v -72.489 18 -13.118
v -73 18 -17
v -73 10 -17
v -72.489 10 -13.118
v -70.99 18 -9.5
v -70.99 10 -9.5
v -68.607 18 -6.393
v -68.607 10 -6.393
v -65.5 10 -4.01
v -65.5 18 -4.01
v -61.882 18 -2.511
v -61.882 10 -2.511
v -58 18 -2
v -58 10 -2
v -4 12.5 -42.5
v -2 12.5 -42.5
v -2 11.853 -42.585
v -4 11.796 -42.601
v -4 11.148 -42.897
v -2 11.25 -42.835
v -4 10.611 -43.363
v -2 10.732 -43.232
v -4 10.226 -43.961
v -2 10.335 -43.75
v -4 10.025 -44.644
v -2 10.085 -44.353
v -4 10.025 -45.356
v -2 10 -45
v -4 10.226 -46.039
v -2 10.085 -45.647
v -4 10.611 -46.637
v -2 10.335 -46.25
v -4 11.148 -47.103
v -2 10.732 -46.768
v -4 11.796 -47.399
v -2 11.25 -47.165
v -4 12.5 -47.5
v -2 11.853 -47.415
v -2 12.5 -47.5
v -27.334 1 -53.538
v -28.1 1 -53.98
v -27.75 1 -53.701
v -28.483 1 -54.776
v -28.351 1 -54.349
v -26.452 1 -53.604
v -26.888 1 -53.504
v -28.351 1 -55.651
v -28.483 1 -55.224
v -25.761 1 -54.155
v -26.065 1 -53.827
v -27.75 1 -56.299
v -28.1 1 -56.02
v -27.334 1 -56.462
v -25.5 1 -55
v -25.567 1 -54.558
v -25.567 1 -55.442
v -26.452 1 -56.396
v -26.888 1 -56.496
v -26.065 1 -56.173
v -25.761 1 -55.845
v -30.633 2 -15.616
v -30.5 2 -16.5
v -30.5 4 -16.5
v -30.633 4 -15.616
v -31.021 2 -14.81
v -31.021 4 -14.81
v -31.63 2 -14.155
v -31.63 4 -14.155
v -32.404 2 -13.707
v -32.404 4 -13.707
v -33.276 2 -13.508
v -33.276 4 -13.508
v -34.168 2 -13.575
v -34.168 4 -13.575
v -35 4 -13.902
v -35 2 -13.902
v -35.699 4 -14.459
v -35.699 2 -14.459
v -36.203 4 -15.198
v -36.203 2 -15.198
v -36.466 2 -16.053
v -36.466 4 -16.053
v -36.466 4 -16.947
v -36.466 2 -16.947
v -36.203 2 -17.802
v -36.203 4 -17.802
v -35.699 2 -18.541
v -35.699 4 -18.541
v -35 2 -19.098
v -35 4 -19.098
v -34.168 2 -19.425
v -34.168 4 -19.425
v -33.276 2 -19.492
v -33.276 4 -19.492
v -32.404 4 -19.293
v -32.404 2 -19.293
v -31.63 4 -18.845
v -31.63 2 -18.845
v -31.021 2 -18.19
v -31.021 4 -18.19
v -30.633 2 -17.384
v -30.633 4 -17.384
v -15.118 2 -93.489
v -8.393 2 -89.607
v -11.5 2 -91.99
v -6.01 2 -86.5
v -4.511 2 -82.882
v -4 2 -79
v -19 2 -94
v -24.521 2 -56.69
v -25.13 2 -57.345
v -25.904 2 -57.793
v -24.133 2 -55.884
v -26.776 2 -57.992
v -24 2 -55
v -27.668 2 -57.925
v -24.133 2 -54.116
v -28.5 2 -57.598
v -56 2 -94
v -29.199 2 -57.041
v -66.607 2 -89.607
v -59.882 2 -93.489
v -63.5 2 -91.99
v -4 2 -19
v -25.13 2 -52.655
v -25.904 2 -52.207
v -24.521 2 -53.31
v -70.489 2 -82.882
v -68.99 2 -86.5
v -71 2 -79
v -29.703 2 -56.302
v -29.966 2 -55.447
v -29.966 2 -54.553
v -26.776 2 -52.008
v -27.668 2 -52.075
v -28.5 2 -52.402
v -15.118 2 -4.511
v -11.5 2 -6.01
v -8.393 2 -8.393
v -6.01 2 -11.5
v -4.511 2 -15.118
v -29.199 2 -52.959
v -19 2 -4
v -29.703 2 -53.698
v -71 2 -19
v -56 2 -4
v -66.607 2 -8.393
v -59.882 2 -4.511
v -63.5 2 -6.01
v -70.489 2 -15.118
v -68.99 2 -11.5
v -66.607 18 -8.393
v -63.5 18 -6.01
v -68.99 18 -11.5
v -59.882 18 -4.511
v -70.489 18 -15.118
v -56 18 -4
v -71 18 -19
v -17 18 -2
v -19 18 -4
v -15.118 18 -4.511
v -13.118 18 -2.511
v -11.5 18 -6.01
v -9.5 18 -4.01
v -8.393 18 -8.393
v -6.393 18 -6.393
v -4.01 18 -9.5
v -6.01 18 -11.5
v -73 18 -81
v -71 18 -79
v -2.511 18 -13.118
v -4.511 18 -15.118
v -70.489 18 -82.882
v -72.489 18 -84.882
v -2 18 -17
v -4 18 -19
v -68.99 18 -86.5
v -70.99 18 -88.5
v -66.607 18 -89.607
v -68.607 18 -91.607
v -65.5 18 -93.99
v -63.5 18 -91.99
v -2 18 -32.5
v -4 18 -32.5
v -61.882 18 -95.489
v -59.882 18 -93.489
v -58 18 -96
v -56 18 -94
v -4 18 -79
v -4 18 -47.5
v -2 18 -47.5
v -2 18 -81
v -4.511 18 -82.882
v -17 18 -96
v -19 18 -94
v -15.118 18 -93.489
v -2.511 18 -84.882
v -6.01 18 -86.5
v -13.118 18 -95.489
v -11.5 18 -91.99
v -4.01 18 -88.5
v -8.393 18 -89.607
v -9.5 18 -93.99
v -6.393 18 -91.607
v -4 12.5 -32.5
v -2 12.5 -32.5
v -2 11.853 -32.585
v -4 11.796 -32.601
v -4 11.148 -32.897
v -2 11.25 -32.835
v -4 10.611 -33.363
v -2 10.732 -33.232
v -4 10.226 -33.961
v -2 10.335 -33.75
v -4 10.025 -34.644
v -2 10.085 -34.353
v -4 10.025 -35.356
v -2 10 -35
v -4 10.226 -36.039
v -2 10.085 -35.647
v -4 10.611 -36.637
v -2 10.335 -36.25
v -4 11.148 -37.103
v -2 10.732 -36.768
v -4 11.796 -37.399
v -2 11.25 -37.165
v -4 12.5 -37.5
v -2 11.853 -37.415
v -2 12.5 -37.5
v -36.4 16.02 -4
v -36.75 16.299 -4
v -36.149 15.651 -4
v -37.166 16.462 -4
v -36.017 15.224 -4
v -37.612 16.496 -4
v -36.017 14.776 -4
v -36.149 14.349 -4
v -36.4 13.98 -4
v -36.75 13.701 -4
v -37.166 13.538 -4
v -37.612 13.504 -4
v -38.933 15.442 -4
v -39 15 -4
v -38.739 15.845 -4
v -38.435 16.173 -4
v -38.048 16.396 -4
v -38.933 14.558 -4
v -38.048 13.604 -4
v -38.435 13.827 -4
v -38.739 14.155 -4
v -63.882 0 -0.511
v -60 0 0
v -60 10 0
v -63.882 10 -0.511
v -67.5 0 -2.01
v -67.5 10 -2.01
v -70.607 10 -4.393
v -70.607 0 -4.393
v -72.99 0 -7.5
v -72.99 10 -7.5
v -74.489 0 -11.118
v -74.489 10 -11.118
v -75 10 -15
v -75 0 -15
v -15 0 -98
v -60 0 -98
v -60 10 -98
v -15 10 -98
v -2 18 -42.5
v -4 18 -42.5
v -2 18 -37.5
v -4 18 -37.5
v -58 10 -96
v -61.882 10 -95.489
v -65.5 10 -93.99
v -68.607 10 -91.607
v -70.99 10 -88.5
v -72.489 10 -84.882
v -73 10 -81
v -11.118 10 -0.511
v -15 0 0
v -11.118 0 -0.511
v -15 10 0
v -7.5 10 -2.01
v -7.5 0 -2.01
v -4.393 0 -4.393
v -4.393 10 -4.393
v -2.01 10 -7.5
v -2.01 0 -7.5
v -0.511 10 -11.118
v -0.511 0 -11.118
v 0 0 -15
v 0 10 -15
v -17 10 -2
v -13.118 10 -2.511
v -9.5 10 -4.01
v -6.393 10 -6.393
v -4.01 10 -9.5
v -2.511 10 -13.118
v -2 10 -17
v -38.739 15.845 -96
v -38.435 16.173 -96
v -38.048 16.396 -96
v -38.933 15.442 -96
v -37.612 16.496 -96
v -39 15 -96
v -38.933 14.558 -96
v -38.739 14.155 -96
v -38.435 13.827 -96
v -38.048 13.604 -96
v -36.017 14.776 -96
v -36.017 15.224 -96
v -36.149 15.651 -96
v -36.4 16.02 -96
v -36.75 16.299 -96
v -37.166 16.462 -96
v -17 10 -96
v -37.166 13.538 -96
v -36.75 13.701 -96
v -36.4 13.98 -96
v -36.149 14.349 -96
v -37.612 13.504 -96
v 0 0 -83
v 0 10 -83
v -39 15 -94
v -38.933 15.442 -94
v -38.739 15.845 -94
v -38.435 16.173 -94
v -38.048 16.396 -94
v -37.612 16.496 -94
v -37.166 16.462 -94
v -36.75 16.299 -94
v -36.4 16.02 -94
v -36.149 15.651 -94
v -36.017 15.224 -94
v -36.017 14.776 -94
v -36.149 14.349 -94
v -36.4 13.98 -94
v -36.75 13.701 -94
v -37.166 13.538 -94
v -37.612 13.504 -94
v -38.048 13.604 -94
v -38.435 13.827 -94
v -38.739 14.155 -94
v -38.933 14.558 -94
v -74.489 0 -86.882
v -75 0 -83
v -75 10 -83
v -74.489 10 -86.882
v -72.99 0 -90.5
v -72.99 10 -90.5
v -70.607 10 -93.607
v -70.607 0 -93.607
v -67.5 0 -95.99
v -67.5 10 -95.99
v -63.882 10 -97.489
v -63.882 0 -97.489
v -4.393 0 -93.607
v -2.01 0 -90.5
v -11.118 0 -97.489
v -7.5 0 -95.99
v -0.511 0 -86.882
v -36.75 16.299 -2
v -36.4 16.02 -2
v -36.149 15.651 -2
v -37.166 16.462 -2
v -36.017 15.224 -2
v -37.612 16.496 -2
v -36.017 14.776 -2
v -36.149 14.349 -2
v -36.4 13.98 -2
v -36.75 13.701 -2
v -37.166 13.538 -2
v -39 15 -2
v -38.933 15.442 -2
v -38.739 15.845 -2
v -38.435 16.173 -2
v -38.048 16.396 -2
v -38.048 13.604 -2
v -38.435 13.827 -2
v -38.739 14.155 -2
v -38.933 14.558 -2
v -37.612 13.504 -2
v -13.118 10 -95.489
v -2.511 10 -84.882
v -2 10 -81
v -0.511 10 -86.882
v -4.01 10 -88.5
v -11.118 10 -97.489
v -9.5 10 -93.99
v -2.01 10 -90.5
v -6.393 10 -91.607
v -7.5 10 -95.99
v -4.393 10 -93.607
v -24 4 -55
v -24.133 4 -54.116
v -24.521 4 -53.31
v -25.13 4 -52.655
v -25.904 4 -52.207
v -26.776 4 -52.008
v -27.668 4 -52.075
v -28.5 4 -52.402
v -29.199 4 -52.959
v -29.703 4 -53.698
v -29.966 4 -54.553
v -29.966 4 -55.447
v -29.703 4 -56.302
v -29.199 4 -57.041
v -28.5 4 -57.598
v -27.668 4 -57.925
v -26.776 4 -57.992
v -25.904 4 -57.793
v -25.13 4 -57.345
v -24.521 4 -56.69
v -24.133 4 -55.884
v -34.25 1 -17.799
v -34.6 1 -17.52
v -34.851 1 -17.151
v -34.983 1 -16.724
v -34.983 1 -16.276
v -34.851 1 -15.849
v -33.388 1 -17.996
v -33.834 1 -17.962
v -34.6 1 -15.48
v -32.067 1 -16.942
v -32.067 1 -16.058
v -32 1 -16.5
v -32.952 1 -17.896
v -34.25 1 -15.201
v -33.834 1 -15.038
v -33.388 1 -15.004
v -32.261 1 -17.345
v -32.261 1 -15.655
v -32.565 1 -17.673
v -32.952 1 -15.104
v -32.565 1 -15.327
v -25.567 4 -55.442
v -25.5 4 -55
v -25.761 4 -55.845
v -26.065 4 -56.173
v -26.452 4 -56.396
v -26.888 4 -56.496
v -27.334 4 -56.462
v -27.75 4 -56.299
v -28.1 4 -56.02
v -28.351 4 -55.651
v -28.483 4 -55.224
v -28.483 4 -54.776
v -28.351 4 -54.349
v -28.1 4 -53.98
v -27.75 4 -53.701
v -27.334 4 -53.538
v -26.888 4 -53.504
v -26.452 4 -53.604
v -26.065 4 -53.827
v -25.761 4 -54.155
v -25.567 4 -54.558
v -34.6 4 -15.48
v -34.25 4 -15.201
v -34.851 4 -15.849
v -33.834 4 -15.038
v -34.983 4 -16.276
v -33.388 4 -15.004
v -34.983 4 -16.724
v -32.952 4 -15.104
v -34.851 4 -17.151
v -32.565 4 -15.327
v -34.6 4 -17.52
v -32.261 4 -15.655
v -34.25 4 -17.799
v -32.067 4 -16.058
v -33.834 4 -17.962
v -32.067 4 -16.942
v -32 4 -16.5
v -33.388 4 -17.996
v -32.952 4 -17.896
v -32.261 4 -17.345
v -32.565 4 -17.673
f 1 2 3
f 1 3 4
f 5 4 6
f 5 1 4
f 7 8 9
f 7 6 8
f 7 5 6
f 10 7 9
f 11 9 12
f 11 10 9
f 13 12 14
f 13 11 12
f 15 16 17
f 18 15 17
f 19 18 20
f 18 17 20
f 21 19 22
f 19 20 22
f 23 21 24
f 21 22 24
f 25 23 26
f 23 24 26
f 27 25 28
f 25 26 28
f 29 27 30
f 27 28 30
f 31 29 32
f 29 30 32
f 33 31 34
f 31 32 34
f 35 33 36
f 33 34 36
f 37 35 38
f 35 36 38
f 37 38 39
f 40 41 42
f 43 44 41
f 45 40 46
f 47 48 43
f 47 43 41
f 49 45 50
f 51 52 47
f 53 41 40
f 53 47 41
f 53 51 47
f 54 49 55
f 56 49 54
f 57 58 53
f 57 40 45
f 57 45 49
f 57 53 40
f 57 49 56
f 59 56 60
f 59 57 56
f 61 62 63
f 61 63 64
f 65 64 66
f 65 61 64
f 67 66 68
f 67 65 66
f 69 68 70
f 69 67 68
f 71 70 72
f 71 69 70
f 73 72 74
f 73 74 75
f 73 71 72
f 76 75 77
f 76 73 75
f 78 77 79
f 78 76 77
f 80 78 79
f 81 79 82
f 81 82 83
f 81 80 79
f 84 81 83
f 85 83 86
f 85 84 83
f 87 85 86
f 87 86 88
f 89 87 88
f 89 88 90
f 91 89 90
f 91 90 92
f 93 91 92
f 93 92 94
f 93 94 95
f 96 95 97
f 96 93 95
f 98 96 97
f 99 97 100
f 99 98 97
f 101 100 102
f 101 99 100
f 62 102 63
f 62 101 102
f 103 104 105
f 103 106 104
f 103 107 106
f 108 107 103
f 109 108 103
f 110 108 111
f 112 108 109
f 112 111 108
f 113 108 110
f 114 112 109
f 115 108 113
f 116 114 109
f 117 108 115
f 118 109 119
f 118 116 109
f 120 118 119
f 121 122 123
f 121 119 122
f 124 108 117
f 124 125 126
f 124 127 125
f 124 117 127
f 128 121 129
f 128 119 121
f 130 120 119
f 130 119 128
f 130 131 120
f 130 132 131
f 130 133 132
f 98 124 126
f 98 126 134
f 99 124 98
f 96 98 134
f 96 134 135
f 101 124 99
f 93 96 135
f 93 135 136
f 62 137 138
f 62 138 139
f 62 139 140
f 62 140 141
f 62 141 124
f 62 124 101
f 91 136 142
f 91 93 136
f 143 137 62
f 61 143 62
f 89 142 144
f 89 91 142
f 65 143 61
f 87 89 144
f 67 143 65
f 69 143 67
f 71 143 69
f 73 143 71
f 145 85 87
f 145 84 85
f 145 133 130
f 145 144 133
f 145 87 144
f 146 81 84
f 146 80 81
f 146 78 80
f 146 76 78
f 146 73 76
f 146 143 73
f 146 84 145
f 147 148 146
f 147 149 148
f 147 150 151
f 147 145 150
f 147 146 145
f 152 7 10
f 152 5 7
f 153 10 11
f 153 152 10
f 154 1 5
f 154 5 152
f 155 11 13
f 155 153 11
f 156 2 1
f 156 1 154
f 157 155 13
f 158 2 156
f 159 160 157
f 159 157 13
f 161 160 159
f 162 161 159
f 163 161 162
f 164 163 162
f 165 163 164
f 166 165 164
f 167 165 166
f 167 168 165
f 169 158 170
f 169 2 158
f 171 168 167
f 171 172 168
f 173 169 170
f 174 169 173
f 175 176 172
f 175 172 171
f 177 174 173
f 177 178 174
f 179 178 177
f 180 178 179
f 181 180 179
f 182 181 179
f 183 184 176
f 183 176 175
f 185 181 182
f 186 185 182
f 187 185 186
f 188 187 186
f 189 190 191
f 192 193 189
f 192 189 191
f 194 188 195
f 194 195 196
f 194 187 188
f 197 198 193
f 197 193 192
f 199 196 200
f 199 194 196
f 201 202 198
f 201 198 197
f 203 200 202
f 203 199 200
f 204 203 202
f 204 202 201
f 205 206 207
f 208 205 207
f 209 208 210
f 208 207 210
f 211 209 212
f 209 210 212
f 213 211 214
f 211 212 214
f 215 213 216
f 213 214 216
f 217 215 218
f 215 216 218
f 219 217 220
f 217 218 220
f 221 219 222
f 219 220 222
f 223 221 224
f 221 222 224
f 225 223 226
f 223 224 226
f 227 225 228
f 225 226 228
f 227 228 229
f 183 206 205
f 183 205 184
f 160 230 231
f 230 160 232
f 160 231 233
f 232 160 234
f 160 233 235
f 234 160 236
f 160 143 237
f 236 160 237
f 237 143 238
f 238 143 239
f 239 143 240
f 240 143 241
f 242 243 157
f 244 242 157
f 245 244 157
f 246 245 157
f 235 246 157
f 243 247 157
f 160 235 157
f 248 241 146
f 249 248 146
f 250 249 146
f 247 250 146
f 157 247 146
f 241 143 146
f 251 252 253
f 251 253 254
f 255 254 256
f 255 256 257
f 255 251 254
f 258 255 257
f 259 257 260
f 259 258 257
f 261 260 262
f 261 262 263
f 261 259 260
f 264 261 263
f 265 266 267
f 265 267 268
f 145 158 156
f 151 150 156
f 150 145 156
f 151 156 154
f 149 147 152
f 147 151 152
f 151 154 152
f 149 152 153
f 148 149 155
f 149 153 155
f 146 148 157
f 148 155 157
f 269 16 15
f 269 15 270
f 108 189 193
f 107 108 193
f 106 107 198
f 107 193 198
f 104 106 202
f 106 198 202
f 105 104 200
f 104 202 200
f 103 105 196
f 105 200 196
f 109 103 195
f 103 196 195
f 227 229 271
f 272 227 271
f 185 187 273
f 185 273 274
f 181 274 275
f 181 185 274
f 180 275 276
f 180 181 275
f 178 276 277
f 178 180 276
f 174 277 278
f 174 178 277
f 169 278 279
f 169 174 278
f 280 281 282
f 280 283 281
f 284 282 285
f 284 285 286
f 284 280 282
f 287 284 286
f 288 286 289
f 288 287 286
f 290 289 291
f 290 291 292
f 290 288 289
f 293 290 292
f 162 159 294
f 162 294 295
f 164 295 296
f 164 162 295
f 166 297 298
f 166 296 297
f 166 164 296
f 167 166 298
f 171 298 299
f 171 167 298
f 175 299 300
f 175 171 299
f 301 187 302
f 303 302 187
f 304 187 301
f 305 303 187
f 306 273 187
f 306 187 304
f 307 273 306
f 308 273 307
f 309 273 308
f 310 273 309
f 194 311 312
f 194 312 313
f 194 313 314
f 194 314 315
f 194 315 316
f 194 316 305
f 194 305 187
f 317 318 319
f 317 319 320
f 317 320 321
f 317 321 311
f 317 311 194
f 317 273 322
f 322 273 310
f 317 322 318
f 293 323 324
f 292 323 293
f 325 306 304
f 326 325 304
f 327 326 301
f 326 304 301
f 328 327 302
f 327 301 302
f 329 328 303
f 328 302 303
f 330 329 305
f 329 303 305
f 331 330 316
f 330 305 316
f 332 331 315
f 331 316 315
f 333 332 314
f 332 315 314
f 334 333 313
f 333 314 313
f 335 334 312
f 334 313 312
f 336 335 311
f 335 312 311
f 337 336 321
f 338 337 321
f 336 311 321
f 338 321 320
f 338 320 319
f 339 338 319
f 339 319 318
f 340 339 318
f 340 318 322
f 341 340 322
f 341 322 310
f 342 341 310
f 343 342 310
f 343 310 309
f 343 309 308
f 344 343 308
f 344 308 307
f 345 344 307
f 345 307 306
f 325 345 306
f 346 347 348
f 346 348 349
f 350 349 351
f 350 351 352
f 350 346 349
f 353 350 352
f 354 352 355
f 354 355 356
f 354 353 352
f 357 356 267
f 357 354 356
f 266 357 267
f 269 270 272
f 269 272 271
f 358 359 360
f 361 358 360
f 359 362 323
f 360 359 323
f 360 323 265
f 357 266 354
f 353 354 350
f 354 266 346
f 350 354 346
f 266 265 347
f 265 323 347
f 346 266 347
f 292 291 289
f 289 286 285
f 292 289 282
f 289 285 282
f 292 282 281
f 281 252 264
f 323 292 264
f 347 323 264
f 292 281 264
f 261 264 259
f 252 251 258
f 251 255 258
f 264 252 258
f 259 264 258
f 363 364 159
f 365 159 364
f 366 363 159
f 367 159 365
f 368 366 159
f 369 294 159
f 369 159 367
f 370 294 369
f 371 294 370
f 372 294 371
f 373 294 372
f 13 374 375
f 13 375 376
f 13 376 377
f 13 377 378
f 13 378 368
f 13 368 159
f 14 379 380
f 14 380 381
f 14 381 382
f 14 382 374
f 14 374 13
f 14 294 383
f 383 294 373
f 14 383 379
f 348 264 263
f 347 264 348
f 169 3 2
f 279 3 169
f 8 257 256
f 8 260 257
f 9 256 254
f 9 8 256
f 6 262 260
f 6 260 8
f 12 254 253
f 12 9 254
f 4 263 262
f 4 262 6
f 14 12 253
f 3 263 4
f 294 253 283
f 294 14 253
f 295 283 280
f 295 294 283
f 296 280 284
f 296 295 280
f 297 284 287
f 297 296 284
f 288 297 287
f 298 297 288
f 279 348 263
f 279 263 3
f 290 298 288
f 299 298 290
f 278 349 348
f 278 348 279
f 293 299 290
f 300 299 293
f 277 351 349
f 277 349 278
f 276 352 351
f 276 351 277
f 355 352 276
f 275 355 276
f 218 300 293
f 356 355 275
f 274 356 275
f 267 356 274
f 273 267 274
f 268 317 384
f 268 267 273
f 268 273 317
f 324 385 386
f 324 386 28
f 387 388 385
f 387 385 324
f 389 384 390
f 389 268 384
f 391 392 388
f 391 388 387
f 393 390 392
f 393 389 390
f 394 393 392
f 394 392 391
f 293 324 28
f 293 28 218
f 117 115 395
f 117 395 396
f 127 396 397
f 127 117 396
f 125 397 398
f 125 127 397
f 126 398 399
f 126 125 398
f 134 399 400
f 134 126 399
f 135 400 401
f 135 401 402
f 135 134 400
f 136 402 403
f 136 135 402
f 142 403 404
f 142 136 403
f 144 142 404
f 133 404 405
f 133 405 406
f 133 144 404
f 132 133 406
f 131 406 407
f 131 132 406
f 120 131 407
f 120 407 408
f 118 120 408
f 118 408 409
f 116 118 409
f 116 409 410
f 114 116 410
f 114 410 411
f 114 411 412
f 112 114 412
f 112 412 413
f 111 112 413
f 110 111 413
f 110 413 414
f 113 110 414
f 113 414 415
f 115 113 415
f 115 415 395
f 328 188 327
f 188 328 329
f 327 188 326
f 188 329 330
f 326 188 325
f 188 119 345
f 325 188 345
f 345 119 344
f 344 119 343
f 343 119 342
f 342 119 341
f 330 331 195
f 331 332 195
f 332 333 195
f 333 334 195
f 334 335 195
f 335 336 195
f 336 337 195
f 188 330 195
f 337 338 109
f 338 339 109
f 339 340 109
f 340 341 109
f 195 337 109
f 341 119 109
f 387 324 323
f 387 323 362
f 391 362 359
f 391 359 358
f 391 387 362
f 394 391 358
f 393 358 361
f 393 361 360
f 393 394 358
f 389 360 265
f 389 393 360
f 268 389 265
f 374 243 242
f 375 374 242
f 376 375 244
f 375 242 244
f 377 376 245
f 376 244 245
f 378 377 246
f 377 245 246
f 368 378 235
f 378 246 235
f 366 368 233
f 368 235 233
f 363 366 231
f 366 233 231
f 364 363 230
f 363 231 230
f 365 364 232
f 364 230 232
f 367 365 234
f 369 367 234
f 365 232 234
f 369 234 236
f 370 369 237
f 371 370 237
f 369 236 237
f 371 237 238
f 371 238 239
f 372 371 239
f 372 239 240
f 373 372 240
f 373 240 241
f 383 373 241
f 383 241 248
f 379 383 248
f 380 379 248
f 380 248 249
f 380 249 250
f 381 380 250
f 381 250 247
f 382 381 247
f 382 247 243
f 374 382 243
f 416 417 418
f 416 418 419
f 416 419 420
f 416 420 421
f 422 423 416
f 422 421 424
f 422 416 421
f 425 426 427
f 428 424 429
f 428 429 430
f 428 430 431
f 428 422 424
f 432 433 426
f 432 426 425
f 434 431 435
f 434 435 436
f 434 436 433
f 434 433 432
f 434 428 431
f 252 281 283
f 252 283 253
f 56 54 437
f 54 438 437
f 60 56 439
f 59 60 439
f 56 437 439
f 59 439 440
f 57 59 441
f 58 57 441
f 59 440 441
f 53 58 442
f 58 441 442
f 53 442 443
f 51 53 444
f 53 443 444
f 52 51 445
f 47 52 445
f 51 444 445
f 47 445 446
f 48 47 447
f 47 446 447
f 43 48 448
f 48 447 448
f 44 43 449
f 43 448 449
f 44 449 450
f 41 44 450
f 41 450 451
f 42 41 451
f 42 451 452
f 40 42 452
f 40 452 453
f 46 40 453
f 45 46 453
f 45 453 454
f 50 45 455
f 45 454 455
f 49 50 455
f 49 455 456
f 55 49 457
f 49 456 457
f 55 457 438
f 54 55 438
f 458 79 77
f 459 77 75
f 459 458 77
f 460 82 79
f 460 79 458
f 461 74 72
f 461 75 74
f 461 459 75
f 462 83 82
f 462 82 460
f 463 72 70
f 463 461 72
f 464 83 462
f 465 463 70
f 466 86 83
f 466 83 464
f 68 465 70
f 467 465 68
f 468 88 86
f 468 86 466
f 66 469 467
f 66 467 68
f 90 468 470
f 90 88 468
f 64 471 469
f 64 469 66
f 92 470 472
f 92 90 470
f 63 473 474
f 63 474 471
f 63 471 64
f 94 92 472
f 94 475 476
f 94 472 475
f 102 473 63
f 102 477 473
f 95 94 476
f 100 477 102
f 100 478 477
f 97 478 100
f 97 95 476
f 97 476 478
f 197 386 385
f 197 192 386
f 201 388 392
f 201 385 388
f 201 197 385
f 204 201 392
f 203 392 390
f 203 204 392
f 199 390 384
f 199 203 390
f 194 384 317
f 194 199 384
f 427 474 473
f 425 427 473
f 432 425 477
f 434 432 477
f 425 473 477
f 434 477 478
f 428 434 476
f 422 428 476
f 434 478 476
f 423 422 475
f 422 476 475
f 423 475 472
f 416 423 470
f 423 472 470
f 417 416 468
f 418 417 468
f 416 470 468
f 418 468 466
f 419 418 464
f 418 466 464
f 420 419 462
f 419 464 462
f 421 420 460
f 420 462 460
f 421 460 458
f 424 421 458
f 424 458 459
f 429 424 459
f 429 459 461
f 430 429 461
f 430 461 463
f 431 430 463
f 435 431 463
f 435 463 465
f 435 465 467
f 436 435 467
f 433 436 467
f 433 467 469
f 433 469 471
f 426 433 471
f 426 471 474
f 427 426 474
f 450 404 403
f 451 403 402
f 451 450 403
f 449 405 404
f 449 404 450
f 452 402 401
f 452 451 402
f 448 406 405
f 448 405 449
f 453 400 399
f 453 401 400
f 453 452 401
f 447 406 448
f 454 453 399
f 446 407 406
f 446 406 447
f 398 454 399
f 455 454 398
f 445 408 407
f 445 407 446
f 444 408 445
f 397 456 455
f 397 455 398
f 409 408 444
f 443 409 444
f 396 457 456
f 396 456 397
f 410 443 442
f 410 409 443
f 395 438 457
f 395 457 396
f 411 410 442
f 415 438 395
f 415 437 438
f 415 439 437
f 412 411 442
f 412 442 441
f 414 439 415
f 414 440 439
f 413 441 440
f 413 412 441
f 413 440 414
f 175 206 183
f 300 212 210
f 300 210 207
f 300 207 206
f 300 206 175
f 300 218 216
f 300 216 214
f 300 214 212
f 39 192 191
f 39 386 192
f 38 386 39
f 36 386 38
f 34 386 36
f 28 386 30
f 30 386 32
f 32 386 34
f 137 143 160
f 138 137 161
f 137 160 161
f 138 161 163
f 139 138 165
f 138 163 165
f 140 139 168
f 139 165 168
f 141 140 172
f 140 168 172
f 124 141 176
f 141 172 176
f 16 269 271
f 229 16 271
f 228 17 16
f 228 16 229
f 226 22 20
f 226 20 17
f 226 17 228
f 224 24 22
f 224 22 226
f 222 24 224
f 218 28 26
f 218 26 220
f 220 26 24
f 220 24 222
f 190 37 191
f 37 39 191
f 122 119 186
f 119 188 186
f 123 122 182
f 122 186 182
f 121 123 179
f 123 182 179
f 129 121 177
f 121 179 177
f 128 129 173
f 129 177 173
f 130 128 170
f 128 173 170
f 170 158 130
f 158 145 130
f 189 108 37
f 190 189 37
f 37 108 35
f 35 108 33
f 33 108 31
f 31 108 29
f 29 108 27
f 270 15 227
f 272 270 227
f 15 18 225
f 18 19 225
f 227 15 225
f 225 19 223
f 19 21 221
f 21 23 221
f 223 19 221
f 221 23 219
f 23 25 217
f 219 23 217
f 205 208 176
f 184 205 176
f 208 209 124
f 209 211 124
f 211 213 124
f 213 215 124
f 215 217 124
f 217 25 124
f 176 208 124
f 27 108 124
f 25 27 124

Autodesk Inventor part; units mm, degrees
ref_plane "YZ Plane" through (0, 0, 0) normal (1, 0, 0) x (0, 1, 0)
ref_plane "XZ Plane" through (0, 0, 0) normal (0, 1, 0) x (-1, 0, 0)
ref_plane "XY Plane" through (0, 0, 0) normal (0, 0, 1) x (1, 0, 0)
sketch "Sketch1" plane through (0, 0, 0) normal (0, 1, 0) x (-1, 0, 0)
  line L0 (0, 0) -> (75, 0)
  line L1 (75, 0) -> (75, -98)
  line L2 (75, -98) -> (0, -98)
  line L3 (0, -98) -> (0, 0)
  dimension "d0" = 75
  dimension "d1" = 98
extrude "Extrusion1" add sketch "Sketch1" along normal blind 2
sketch "Sketch2" plane through (0, 2, 0) normal (0, 1, 0) x (1, 0, 0)
  line L0 (-75, 0) -> (0, 0)
  line L1 (0, 0) -> (0, 98)
  line L2 (0, 98) -> (-75, 98)
  line L3 (-75, 98) -> (-75, 0)
  line L4 (-73, 2) -> (-2, 2)
  line L5 (-2, 2) -> (-2, 96)
  line L6 (-2, 96) -> (-73, 96)
  line L7 (-73, 96) -> (-73, 2)
  line L8 (-37.5, 2) -> (-37.5, 96)
  line L9 (-37.5, 0) -> (-37.5, 98)
  line L10 (-75, 0) -> (0, 0) projected
  line L11 (-37.5, 0) -> (-37.5, 98)
  line L12 (0, 98) -> (-75, 98) projected
  point P0 (-37.5, 49)
  dimension "d4" = 75
  dimension "d5" = 98
  dimension "d6" = 71
  dimension "d7" = 94
extrude "Extrusion2" add sketch "Sketch2" along normal blind 8 contours L3 L2 L9 L6 L7 L4 L0 | L9 L4 L5 L6 L2 L1 L0
sketch "Sketch5" plane through (0, 2, 0) normal (0, 1, 0) x (1, 0, 0)
  line L0 (-2, 2) -> (-73, 2) projected
  line L1 (-73, 96) -> (-2, 96) projected
  line L2 (-2, 2) -> (-73, 2)
  line L3 (-73, 2) -> (-73, 96)
  line L4 (-73, 96) -> (-2, 96)
  line L5 (-2, 96) -> (-2, 2)
  line L6 (-4, 4) -> (-71, 4)
  line L7 (-71, 4) -> (-71, 94)
  line L8 (-71, 94) -> (-4, 94)
  line L9 (-4, 94) -> (-4, 4)
  line L10 (-37.5, 4) -> (-37.5, 94)
  line L11 (-37.5, 2) -> (-37.5, 96)
  point P0 (0, 0)
  point P1 (-37.5, 49)
  dimension "d11" = 67
  dimension "d12" = 90
extrude "Extrusion3" add sketch "Sketch5" along normal blind 16 contours L0 L11 L6 L9 L8 L1 L5 | L0 L3 L1 L11 L8 L7 L6
fillet "Fillet2" radius 15 12 edges at (0, 5, 0) (-2, 14, -2) (0, 5, -98) (-2, 14, -96) (-75, 5, -98) (-73, 14, -96) (-71, 10, -4) (-75, 5, 0) (-73, 14, -2) (-4, 10, -4) (-71, 10, -94) (-4, 10, -94)
sketch "Sketch6" plane through (0, 2, 0) normal (0, 1, 0) x (1, 0, 0)
  line L0 (-18.5, 14) -> (-56.5, 14)
  line L1 (-56.5, 14) -> (-56.5, 68)
  line L2 (-56.5, 68) -> (-18.5, 68)
  line L3 (-18.5, 68) -> (-18.5, 14)
  line L4 (-18.5, 14) -> (-33.5, 14)
  line L5 (-33.5, 14) -> (-33.5, 16.5)
  line L6 (-33.5, 16.5) -> (-18.5, 16.5)
  line L7 (-18.5, 16.5) -> (-18.5, 14)
  line L8 (-18.5, 14) -> (-27, 14)
  line L9 (-27, 14) -> (-27, 55)
  line L10 (-27, 55) -> (-18.5, 55)
  line L11 (-18.5, 55) -> (-18.5, 14)
  circle A0 centre (-33.5, 16.5) radius 3
  circle A1 centre (-27, 55) radius 3
  line L12 (-19, 4) -> (-56, 4) projected
  line L13 (-37.5, 4) -> (-37.5, 94)
  line L14 (-19, 94) -> (-56, 94) projected
  line L15 (-37.5, 4) -> (-39.5, 4)
  line L16 (-39.5, 4) -> (-39.5, 14)
  line L17 (-39.5, 14) -> (-37.5, 14)
  line L18 (-37.5, 14) -> (-37.5, 4)
  point P0 (0, 0)
  dimension "d16" = 38
  dimension "d17" = 54
  dimension "d18" = 15
  dimension "d19" = 2.5
  dimension "d20" = 8.5
  dimension "d21" = 41
  dimension "d22" = 6
  dimension "d23" = 6
  dimension "d24" = 2
  dimension "d25" = 10
extrude "Extrusion4" add sketch "Sketch6" along normal blind 2 contours A0 L0 | L0 L5 L6 A0 | L0 A0 L6 L5 | A1 L10 L9 | L9 L10 A1
sketch "Sketch7" plane through (-33.5, 4, -16.5) normal (0, 1, 0) x (1, 0, 0)
  circle A0 centre (0, 0) radius 3 projected
  circle A1 centre (0, 0) radius 1.5
  circle A2 centre (6.5, 38.5) radius 3 projected
  circle A3 centre (6.5, 38.5) radius 1.5
  point P0 (33.5, -16.5)
  dimension "d28" = 3
  dimension "d29" = 3
extrude "Extrusion5" cut sketch "Sketch7" against normal blind 3 contours A1 | A3
sketch "Sketch8" plane through (-17, 18, -96) normal (0, 0, -1) x (-1, 0, 0)
  line L0 (41, -8) -> (41, 0) projected
  line L1 (41, -8) -> (0, -8)
  line L2 (0, -8) -> (0, -3)
  line L3 (0, -3) -> (41, -3)
  line L4 (41, -3) -> (41, -8)
  circle A0 centre (20.5, -3) radius 1.5
  point P0 (-17, -18)
  dimension "d32" = 41
  dimension "d33" = 5
  dimension "d34" = 3
extrude "Extrusion6" cut sketch "Sketch8" against normal blind 100 contours A0 L3 | L3 A0
sketch "Sketch9" plane through (0, 2, 0) normal (0, 1, 0) x (1, 0, 0)
  point P0 (0, 0)
sketch "Sketch10" plane through (-2, 10, -81) normal (1, 0, 0) x (0, 0, -1)
  line L0 (-66, -10) -> (-66, 0) projected
  line L1 (-66, 0) -> (-46, 0)
  line L2 (-46, 0) -> (-46, 2.5)
  line L3 (-46, 2.5) -> (-66, 2.5)
  line L4 (-66, 2.5) -> (-66, 0)
  line L5 (-66, 0) -> (-36, 0)
  line L6 (-36, 0) -> (-36, 2.5)
  line L7 (-36, 2.5) -> (-66, 2.5)
  line L8 (-66, 2.5) -> (-66, 0)
  circle A0 centre (-46, 2.5) radius 2.5
  circle A1 centre (-36, 2.5) radius 2.5
  line L9 (-48.5, 2.5) -> (-48.5, 8)
  line L10 (-2, 8) -> (-62, 8) projected
  line L11 (-43.5, 2.5) -> (-43.5, 8)
  line L12 (-38.5, 2.5) -> (-38.5, 8)
  line L13 (-33.5, 2.5) -> (-33.5, 8)
  point P0 (-81, -10)
  dimension "d37" = 20
  dimension "d38" = 2.5
  dimension "d39" = 30
  dimension "d40" = 2.5
  dimension "d41" = 5
  dimension "d42" = 5
extrude "Extrusion7" cut sketch "Sketch10" against normal blind 5 contours A0 L3 L2 | L2 L7 A0 | L3 A0 L7 | A1 L7 L6 | L6 L7 A1 | L9 L10 L11 A0 | L12 L10 L13 A1
properties part number "reduced_tortoise_3_base"
